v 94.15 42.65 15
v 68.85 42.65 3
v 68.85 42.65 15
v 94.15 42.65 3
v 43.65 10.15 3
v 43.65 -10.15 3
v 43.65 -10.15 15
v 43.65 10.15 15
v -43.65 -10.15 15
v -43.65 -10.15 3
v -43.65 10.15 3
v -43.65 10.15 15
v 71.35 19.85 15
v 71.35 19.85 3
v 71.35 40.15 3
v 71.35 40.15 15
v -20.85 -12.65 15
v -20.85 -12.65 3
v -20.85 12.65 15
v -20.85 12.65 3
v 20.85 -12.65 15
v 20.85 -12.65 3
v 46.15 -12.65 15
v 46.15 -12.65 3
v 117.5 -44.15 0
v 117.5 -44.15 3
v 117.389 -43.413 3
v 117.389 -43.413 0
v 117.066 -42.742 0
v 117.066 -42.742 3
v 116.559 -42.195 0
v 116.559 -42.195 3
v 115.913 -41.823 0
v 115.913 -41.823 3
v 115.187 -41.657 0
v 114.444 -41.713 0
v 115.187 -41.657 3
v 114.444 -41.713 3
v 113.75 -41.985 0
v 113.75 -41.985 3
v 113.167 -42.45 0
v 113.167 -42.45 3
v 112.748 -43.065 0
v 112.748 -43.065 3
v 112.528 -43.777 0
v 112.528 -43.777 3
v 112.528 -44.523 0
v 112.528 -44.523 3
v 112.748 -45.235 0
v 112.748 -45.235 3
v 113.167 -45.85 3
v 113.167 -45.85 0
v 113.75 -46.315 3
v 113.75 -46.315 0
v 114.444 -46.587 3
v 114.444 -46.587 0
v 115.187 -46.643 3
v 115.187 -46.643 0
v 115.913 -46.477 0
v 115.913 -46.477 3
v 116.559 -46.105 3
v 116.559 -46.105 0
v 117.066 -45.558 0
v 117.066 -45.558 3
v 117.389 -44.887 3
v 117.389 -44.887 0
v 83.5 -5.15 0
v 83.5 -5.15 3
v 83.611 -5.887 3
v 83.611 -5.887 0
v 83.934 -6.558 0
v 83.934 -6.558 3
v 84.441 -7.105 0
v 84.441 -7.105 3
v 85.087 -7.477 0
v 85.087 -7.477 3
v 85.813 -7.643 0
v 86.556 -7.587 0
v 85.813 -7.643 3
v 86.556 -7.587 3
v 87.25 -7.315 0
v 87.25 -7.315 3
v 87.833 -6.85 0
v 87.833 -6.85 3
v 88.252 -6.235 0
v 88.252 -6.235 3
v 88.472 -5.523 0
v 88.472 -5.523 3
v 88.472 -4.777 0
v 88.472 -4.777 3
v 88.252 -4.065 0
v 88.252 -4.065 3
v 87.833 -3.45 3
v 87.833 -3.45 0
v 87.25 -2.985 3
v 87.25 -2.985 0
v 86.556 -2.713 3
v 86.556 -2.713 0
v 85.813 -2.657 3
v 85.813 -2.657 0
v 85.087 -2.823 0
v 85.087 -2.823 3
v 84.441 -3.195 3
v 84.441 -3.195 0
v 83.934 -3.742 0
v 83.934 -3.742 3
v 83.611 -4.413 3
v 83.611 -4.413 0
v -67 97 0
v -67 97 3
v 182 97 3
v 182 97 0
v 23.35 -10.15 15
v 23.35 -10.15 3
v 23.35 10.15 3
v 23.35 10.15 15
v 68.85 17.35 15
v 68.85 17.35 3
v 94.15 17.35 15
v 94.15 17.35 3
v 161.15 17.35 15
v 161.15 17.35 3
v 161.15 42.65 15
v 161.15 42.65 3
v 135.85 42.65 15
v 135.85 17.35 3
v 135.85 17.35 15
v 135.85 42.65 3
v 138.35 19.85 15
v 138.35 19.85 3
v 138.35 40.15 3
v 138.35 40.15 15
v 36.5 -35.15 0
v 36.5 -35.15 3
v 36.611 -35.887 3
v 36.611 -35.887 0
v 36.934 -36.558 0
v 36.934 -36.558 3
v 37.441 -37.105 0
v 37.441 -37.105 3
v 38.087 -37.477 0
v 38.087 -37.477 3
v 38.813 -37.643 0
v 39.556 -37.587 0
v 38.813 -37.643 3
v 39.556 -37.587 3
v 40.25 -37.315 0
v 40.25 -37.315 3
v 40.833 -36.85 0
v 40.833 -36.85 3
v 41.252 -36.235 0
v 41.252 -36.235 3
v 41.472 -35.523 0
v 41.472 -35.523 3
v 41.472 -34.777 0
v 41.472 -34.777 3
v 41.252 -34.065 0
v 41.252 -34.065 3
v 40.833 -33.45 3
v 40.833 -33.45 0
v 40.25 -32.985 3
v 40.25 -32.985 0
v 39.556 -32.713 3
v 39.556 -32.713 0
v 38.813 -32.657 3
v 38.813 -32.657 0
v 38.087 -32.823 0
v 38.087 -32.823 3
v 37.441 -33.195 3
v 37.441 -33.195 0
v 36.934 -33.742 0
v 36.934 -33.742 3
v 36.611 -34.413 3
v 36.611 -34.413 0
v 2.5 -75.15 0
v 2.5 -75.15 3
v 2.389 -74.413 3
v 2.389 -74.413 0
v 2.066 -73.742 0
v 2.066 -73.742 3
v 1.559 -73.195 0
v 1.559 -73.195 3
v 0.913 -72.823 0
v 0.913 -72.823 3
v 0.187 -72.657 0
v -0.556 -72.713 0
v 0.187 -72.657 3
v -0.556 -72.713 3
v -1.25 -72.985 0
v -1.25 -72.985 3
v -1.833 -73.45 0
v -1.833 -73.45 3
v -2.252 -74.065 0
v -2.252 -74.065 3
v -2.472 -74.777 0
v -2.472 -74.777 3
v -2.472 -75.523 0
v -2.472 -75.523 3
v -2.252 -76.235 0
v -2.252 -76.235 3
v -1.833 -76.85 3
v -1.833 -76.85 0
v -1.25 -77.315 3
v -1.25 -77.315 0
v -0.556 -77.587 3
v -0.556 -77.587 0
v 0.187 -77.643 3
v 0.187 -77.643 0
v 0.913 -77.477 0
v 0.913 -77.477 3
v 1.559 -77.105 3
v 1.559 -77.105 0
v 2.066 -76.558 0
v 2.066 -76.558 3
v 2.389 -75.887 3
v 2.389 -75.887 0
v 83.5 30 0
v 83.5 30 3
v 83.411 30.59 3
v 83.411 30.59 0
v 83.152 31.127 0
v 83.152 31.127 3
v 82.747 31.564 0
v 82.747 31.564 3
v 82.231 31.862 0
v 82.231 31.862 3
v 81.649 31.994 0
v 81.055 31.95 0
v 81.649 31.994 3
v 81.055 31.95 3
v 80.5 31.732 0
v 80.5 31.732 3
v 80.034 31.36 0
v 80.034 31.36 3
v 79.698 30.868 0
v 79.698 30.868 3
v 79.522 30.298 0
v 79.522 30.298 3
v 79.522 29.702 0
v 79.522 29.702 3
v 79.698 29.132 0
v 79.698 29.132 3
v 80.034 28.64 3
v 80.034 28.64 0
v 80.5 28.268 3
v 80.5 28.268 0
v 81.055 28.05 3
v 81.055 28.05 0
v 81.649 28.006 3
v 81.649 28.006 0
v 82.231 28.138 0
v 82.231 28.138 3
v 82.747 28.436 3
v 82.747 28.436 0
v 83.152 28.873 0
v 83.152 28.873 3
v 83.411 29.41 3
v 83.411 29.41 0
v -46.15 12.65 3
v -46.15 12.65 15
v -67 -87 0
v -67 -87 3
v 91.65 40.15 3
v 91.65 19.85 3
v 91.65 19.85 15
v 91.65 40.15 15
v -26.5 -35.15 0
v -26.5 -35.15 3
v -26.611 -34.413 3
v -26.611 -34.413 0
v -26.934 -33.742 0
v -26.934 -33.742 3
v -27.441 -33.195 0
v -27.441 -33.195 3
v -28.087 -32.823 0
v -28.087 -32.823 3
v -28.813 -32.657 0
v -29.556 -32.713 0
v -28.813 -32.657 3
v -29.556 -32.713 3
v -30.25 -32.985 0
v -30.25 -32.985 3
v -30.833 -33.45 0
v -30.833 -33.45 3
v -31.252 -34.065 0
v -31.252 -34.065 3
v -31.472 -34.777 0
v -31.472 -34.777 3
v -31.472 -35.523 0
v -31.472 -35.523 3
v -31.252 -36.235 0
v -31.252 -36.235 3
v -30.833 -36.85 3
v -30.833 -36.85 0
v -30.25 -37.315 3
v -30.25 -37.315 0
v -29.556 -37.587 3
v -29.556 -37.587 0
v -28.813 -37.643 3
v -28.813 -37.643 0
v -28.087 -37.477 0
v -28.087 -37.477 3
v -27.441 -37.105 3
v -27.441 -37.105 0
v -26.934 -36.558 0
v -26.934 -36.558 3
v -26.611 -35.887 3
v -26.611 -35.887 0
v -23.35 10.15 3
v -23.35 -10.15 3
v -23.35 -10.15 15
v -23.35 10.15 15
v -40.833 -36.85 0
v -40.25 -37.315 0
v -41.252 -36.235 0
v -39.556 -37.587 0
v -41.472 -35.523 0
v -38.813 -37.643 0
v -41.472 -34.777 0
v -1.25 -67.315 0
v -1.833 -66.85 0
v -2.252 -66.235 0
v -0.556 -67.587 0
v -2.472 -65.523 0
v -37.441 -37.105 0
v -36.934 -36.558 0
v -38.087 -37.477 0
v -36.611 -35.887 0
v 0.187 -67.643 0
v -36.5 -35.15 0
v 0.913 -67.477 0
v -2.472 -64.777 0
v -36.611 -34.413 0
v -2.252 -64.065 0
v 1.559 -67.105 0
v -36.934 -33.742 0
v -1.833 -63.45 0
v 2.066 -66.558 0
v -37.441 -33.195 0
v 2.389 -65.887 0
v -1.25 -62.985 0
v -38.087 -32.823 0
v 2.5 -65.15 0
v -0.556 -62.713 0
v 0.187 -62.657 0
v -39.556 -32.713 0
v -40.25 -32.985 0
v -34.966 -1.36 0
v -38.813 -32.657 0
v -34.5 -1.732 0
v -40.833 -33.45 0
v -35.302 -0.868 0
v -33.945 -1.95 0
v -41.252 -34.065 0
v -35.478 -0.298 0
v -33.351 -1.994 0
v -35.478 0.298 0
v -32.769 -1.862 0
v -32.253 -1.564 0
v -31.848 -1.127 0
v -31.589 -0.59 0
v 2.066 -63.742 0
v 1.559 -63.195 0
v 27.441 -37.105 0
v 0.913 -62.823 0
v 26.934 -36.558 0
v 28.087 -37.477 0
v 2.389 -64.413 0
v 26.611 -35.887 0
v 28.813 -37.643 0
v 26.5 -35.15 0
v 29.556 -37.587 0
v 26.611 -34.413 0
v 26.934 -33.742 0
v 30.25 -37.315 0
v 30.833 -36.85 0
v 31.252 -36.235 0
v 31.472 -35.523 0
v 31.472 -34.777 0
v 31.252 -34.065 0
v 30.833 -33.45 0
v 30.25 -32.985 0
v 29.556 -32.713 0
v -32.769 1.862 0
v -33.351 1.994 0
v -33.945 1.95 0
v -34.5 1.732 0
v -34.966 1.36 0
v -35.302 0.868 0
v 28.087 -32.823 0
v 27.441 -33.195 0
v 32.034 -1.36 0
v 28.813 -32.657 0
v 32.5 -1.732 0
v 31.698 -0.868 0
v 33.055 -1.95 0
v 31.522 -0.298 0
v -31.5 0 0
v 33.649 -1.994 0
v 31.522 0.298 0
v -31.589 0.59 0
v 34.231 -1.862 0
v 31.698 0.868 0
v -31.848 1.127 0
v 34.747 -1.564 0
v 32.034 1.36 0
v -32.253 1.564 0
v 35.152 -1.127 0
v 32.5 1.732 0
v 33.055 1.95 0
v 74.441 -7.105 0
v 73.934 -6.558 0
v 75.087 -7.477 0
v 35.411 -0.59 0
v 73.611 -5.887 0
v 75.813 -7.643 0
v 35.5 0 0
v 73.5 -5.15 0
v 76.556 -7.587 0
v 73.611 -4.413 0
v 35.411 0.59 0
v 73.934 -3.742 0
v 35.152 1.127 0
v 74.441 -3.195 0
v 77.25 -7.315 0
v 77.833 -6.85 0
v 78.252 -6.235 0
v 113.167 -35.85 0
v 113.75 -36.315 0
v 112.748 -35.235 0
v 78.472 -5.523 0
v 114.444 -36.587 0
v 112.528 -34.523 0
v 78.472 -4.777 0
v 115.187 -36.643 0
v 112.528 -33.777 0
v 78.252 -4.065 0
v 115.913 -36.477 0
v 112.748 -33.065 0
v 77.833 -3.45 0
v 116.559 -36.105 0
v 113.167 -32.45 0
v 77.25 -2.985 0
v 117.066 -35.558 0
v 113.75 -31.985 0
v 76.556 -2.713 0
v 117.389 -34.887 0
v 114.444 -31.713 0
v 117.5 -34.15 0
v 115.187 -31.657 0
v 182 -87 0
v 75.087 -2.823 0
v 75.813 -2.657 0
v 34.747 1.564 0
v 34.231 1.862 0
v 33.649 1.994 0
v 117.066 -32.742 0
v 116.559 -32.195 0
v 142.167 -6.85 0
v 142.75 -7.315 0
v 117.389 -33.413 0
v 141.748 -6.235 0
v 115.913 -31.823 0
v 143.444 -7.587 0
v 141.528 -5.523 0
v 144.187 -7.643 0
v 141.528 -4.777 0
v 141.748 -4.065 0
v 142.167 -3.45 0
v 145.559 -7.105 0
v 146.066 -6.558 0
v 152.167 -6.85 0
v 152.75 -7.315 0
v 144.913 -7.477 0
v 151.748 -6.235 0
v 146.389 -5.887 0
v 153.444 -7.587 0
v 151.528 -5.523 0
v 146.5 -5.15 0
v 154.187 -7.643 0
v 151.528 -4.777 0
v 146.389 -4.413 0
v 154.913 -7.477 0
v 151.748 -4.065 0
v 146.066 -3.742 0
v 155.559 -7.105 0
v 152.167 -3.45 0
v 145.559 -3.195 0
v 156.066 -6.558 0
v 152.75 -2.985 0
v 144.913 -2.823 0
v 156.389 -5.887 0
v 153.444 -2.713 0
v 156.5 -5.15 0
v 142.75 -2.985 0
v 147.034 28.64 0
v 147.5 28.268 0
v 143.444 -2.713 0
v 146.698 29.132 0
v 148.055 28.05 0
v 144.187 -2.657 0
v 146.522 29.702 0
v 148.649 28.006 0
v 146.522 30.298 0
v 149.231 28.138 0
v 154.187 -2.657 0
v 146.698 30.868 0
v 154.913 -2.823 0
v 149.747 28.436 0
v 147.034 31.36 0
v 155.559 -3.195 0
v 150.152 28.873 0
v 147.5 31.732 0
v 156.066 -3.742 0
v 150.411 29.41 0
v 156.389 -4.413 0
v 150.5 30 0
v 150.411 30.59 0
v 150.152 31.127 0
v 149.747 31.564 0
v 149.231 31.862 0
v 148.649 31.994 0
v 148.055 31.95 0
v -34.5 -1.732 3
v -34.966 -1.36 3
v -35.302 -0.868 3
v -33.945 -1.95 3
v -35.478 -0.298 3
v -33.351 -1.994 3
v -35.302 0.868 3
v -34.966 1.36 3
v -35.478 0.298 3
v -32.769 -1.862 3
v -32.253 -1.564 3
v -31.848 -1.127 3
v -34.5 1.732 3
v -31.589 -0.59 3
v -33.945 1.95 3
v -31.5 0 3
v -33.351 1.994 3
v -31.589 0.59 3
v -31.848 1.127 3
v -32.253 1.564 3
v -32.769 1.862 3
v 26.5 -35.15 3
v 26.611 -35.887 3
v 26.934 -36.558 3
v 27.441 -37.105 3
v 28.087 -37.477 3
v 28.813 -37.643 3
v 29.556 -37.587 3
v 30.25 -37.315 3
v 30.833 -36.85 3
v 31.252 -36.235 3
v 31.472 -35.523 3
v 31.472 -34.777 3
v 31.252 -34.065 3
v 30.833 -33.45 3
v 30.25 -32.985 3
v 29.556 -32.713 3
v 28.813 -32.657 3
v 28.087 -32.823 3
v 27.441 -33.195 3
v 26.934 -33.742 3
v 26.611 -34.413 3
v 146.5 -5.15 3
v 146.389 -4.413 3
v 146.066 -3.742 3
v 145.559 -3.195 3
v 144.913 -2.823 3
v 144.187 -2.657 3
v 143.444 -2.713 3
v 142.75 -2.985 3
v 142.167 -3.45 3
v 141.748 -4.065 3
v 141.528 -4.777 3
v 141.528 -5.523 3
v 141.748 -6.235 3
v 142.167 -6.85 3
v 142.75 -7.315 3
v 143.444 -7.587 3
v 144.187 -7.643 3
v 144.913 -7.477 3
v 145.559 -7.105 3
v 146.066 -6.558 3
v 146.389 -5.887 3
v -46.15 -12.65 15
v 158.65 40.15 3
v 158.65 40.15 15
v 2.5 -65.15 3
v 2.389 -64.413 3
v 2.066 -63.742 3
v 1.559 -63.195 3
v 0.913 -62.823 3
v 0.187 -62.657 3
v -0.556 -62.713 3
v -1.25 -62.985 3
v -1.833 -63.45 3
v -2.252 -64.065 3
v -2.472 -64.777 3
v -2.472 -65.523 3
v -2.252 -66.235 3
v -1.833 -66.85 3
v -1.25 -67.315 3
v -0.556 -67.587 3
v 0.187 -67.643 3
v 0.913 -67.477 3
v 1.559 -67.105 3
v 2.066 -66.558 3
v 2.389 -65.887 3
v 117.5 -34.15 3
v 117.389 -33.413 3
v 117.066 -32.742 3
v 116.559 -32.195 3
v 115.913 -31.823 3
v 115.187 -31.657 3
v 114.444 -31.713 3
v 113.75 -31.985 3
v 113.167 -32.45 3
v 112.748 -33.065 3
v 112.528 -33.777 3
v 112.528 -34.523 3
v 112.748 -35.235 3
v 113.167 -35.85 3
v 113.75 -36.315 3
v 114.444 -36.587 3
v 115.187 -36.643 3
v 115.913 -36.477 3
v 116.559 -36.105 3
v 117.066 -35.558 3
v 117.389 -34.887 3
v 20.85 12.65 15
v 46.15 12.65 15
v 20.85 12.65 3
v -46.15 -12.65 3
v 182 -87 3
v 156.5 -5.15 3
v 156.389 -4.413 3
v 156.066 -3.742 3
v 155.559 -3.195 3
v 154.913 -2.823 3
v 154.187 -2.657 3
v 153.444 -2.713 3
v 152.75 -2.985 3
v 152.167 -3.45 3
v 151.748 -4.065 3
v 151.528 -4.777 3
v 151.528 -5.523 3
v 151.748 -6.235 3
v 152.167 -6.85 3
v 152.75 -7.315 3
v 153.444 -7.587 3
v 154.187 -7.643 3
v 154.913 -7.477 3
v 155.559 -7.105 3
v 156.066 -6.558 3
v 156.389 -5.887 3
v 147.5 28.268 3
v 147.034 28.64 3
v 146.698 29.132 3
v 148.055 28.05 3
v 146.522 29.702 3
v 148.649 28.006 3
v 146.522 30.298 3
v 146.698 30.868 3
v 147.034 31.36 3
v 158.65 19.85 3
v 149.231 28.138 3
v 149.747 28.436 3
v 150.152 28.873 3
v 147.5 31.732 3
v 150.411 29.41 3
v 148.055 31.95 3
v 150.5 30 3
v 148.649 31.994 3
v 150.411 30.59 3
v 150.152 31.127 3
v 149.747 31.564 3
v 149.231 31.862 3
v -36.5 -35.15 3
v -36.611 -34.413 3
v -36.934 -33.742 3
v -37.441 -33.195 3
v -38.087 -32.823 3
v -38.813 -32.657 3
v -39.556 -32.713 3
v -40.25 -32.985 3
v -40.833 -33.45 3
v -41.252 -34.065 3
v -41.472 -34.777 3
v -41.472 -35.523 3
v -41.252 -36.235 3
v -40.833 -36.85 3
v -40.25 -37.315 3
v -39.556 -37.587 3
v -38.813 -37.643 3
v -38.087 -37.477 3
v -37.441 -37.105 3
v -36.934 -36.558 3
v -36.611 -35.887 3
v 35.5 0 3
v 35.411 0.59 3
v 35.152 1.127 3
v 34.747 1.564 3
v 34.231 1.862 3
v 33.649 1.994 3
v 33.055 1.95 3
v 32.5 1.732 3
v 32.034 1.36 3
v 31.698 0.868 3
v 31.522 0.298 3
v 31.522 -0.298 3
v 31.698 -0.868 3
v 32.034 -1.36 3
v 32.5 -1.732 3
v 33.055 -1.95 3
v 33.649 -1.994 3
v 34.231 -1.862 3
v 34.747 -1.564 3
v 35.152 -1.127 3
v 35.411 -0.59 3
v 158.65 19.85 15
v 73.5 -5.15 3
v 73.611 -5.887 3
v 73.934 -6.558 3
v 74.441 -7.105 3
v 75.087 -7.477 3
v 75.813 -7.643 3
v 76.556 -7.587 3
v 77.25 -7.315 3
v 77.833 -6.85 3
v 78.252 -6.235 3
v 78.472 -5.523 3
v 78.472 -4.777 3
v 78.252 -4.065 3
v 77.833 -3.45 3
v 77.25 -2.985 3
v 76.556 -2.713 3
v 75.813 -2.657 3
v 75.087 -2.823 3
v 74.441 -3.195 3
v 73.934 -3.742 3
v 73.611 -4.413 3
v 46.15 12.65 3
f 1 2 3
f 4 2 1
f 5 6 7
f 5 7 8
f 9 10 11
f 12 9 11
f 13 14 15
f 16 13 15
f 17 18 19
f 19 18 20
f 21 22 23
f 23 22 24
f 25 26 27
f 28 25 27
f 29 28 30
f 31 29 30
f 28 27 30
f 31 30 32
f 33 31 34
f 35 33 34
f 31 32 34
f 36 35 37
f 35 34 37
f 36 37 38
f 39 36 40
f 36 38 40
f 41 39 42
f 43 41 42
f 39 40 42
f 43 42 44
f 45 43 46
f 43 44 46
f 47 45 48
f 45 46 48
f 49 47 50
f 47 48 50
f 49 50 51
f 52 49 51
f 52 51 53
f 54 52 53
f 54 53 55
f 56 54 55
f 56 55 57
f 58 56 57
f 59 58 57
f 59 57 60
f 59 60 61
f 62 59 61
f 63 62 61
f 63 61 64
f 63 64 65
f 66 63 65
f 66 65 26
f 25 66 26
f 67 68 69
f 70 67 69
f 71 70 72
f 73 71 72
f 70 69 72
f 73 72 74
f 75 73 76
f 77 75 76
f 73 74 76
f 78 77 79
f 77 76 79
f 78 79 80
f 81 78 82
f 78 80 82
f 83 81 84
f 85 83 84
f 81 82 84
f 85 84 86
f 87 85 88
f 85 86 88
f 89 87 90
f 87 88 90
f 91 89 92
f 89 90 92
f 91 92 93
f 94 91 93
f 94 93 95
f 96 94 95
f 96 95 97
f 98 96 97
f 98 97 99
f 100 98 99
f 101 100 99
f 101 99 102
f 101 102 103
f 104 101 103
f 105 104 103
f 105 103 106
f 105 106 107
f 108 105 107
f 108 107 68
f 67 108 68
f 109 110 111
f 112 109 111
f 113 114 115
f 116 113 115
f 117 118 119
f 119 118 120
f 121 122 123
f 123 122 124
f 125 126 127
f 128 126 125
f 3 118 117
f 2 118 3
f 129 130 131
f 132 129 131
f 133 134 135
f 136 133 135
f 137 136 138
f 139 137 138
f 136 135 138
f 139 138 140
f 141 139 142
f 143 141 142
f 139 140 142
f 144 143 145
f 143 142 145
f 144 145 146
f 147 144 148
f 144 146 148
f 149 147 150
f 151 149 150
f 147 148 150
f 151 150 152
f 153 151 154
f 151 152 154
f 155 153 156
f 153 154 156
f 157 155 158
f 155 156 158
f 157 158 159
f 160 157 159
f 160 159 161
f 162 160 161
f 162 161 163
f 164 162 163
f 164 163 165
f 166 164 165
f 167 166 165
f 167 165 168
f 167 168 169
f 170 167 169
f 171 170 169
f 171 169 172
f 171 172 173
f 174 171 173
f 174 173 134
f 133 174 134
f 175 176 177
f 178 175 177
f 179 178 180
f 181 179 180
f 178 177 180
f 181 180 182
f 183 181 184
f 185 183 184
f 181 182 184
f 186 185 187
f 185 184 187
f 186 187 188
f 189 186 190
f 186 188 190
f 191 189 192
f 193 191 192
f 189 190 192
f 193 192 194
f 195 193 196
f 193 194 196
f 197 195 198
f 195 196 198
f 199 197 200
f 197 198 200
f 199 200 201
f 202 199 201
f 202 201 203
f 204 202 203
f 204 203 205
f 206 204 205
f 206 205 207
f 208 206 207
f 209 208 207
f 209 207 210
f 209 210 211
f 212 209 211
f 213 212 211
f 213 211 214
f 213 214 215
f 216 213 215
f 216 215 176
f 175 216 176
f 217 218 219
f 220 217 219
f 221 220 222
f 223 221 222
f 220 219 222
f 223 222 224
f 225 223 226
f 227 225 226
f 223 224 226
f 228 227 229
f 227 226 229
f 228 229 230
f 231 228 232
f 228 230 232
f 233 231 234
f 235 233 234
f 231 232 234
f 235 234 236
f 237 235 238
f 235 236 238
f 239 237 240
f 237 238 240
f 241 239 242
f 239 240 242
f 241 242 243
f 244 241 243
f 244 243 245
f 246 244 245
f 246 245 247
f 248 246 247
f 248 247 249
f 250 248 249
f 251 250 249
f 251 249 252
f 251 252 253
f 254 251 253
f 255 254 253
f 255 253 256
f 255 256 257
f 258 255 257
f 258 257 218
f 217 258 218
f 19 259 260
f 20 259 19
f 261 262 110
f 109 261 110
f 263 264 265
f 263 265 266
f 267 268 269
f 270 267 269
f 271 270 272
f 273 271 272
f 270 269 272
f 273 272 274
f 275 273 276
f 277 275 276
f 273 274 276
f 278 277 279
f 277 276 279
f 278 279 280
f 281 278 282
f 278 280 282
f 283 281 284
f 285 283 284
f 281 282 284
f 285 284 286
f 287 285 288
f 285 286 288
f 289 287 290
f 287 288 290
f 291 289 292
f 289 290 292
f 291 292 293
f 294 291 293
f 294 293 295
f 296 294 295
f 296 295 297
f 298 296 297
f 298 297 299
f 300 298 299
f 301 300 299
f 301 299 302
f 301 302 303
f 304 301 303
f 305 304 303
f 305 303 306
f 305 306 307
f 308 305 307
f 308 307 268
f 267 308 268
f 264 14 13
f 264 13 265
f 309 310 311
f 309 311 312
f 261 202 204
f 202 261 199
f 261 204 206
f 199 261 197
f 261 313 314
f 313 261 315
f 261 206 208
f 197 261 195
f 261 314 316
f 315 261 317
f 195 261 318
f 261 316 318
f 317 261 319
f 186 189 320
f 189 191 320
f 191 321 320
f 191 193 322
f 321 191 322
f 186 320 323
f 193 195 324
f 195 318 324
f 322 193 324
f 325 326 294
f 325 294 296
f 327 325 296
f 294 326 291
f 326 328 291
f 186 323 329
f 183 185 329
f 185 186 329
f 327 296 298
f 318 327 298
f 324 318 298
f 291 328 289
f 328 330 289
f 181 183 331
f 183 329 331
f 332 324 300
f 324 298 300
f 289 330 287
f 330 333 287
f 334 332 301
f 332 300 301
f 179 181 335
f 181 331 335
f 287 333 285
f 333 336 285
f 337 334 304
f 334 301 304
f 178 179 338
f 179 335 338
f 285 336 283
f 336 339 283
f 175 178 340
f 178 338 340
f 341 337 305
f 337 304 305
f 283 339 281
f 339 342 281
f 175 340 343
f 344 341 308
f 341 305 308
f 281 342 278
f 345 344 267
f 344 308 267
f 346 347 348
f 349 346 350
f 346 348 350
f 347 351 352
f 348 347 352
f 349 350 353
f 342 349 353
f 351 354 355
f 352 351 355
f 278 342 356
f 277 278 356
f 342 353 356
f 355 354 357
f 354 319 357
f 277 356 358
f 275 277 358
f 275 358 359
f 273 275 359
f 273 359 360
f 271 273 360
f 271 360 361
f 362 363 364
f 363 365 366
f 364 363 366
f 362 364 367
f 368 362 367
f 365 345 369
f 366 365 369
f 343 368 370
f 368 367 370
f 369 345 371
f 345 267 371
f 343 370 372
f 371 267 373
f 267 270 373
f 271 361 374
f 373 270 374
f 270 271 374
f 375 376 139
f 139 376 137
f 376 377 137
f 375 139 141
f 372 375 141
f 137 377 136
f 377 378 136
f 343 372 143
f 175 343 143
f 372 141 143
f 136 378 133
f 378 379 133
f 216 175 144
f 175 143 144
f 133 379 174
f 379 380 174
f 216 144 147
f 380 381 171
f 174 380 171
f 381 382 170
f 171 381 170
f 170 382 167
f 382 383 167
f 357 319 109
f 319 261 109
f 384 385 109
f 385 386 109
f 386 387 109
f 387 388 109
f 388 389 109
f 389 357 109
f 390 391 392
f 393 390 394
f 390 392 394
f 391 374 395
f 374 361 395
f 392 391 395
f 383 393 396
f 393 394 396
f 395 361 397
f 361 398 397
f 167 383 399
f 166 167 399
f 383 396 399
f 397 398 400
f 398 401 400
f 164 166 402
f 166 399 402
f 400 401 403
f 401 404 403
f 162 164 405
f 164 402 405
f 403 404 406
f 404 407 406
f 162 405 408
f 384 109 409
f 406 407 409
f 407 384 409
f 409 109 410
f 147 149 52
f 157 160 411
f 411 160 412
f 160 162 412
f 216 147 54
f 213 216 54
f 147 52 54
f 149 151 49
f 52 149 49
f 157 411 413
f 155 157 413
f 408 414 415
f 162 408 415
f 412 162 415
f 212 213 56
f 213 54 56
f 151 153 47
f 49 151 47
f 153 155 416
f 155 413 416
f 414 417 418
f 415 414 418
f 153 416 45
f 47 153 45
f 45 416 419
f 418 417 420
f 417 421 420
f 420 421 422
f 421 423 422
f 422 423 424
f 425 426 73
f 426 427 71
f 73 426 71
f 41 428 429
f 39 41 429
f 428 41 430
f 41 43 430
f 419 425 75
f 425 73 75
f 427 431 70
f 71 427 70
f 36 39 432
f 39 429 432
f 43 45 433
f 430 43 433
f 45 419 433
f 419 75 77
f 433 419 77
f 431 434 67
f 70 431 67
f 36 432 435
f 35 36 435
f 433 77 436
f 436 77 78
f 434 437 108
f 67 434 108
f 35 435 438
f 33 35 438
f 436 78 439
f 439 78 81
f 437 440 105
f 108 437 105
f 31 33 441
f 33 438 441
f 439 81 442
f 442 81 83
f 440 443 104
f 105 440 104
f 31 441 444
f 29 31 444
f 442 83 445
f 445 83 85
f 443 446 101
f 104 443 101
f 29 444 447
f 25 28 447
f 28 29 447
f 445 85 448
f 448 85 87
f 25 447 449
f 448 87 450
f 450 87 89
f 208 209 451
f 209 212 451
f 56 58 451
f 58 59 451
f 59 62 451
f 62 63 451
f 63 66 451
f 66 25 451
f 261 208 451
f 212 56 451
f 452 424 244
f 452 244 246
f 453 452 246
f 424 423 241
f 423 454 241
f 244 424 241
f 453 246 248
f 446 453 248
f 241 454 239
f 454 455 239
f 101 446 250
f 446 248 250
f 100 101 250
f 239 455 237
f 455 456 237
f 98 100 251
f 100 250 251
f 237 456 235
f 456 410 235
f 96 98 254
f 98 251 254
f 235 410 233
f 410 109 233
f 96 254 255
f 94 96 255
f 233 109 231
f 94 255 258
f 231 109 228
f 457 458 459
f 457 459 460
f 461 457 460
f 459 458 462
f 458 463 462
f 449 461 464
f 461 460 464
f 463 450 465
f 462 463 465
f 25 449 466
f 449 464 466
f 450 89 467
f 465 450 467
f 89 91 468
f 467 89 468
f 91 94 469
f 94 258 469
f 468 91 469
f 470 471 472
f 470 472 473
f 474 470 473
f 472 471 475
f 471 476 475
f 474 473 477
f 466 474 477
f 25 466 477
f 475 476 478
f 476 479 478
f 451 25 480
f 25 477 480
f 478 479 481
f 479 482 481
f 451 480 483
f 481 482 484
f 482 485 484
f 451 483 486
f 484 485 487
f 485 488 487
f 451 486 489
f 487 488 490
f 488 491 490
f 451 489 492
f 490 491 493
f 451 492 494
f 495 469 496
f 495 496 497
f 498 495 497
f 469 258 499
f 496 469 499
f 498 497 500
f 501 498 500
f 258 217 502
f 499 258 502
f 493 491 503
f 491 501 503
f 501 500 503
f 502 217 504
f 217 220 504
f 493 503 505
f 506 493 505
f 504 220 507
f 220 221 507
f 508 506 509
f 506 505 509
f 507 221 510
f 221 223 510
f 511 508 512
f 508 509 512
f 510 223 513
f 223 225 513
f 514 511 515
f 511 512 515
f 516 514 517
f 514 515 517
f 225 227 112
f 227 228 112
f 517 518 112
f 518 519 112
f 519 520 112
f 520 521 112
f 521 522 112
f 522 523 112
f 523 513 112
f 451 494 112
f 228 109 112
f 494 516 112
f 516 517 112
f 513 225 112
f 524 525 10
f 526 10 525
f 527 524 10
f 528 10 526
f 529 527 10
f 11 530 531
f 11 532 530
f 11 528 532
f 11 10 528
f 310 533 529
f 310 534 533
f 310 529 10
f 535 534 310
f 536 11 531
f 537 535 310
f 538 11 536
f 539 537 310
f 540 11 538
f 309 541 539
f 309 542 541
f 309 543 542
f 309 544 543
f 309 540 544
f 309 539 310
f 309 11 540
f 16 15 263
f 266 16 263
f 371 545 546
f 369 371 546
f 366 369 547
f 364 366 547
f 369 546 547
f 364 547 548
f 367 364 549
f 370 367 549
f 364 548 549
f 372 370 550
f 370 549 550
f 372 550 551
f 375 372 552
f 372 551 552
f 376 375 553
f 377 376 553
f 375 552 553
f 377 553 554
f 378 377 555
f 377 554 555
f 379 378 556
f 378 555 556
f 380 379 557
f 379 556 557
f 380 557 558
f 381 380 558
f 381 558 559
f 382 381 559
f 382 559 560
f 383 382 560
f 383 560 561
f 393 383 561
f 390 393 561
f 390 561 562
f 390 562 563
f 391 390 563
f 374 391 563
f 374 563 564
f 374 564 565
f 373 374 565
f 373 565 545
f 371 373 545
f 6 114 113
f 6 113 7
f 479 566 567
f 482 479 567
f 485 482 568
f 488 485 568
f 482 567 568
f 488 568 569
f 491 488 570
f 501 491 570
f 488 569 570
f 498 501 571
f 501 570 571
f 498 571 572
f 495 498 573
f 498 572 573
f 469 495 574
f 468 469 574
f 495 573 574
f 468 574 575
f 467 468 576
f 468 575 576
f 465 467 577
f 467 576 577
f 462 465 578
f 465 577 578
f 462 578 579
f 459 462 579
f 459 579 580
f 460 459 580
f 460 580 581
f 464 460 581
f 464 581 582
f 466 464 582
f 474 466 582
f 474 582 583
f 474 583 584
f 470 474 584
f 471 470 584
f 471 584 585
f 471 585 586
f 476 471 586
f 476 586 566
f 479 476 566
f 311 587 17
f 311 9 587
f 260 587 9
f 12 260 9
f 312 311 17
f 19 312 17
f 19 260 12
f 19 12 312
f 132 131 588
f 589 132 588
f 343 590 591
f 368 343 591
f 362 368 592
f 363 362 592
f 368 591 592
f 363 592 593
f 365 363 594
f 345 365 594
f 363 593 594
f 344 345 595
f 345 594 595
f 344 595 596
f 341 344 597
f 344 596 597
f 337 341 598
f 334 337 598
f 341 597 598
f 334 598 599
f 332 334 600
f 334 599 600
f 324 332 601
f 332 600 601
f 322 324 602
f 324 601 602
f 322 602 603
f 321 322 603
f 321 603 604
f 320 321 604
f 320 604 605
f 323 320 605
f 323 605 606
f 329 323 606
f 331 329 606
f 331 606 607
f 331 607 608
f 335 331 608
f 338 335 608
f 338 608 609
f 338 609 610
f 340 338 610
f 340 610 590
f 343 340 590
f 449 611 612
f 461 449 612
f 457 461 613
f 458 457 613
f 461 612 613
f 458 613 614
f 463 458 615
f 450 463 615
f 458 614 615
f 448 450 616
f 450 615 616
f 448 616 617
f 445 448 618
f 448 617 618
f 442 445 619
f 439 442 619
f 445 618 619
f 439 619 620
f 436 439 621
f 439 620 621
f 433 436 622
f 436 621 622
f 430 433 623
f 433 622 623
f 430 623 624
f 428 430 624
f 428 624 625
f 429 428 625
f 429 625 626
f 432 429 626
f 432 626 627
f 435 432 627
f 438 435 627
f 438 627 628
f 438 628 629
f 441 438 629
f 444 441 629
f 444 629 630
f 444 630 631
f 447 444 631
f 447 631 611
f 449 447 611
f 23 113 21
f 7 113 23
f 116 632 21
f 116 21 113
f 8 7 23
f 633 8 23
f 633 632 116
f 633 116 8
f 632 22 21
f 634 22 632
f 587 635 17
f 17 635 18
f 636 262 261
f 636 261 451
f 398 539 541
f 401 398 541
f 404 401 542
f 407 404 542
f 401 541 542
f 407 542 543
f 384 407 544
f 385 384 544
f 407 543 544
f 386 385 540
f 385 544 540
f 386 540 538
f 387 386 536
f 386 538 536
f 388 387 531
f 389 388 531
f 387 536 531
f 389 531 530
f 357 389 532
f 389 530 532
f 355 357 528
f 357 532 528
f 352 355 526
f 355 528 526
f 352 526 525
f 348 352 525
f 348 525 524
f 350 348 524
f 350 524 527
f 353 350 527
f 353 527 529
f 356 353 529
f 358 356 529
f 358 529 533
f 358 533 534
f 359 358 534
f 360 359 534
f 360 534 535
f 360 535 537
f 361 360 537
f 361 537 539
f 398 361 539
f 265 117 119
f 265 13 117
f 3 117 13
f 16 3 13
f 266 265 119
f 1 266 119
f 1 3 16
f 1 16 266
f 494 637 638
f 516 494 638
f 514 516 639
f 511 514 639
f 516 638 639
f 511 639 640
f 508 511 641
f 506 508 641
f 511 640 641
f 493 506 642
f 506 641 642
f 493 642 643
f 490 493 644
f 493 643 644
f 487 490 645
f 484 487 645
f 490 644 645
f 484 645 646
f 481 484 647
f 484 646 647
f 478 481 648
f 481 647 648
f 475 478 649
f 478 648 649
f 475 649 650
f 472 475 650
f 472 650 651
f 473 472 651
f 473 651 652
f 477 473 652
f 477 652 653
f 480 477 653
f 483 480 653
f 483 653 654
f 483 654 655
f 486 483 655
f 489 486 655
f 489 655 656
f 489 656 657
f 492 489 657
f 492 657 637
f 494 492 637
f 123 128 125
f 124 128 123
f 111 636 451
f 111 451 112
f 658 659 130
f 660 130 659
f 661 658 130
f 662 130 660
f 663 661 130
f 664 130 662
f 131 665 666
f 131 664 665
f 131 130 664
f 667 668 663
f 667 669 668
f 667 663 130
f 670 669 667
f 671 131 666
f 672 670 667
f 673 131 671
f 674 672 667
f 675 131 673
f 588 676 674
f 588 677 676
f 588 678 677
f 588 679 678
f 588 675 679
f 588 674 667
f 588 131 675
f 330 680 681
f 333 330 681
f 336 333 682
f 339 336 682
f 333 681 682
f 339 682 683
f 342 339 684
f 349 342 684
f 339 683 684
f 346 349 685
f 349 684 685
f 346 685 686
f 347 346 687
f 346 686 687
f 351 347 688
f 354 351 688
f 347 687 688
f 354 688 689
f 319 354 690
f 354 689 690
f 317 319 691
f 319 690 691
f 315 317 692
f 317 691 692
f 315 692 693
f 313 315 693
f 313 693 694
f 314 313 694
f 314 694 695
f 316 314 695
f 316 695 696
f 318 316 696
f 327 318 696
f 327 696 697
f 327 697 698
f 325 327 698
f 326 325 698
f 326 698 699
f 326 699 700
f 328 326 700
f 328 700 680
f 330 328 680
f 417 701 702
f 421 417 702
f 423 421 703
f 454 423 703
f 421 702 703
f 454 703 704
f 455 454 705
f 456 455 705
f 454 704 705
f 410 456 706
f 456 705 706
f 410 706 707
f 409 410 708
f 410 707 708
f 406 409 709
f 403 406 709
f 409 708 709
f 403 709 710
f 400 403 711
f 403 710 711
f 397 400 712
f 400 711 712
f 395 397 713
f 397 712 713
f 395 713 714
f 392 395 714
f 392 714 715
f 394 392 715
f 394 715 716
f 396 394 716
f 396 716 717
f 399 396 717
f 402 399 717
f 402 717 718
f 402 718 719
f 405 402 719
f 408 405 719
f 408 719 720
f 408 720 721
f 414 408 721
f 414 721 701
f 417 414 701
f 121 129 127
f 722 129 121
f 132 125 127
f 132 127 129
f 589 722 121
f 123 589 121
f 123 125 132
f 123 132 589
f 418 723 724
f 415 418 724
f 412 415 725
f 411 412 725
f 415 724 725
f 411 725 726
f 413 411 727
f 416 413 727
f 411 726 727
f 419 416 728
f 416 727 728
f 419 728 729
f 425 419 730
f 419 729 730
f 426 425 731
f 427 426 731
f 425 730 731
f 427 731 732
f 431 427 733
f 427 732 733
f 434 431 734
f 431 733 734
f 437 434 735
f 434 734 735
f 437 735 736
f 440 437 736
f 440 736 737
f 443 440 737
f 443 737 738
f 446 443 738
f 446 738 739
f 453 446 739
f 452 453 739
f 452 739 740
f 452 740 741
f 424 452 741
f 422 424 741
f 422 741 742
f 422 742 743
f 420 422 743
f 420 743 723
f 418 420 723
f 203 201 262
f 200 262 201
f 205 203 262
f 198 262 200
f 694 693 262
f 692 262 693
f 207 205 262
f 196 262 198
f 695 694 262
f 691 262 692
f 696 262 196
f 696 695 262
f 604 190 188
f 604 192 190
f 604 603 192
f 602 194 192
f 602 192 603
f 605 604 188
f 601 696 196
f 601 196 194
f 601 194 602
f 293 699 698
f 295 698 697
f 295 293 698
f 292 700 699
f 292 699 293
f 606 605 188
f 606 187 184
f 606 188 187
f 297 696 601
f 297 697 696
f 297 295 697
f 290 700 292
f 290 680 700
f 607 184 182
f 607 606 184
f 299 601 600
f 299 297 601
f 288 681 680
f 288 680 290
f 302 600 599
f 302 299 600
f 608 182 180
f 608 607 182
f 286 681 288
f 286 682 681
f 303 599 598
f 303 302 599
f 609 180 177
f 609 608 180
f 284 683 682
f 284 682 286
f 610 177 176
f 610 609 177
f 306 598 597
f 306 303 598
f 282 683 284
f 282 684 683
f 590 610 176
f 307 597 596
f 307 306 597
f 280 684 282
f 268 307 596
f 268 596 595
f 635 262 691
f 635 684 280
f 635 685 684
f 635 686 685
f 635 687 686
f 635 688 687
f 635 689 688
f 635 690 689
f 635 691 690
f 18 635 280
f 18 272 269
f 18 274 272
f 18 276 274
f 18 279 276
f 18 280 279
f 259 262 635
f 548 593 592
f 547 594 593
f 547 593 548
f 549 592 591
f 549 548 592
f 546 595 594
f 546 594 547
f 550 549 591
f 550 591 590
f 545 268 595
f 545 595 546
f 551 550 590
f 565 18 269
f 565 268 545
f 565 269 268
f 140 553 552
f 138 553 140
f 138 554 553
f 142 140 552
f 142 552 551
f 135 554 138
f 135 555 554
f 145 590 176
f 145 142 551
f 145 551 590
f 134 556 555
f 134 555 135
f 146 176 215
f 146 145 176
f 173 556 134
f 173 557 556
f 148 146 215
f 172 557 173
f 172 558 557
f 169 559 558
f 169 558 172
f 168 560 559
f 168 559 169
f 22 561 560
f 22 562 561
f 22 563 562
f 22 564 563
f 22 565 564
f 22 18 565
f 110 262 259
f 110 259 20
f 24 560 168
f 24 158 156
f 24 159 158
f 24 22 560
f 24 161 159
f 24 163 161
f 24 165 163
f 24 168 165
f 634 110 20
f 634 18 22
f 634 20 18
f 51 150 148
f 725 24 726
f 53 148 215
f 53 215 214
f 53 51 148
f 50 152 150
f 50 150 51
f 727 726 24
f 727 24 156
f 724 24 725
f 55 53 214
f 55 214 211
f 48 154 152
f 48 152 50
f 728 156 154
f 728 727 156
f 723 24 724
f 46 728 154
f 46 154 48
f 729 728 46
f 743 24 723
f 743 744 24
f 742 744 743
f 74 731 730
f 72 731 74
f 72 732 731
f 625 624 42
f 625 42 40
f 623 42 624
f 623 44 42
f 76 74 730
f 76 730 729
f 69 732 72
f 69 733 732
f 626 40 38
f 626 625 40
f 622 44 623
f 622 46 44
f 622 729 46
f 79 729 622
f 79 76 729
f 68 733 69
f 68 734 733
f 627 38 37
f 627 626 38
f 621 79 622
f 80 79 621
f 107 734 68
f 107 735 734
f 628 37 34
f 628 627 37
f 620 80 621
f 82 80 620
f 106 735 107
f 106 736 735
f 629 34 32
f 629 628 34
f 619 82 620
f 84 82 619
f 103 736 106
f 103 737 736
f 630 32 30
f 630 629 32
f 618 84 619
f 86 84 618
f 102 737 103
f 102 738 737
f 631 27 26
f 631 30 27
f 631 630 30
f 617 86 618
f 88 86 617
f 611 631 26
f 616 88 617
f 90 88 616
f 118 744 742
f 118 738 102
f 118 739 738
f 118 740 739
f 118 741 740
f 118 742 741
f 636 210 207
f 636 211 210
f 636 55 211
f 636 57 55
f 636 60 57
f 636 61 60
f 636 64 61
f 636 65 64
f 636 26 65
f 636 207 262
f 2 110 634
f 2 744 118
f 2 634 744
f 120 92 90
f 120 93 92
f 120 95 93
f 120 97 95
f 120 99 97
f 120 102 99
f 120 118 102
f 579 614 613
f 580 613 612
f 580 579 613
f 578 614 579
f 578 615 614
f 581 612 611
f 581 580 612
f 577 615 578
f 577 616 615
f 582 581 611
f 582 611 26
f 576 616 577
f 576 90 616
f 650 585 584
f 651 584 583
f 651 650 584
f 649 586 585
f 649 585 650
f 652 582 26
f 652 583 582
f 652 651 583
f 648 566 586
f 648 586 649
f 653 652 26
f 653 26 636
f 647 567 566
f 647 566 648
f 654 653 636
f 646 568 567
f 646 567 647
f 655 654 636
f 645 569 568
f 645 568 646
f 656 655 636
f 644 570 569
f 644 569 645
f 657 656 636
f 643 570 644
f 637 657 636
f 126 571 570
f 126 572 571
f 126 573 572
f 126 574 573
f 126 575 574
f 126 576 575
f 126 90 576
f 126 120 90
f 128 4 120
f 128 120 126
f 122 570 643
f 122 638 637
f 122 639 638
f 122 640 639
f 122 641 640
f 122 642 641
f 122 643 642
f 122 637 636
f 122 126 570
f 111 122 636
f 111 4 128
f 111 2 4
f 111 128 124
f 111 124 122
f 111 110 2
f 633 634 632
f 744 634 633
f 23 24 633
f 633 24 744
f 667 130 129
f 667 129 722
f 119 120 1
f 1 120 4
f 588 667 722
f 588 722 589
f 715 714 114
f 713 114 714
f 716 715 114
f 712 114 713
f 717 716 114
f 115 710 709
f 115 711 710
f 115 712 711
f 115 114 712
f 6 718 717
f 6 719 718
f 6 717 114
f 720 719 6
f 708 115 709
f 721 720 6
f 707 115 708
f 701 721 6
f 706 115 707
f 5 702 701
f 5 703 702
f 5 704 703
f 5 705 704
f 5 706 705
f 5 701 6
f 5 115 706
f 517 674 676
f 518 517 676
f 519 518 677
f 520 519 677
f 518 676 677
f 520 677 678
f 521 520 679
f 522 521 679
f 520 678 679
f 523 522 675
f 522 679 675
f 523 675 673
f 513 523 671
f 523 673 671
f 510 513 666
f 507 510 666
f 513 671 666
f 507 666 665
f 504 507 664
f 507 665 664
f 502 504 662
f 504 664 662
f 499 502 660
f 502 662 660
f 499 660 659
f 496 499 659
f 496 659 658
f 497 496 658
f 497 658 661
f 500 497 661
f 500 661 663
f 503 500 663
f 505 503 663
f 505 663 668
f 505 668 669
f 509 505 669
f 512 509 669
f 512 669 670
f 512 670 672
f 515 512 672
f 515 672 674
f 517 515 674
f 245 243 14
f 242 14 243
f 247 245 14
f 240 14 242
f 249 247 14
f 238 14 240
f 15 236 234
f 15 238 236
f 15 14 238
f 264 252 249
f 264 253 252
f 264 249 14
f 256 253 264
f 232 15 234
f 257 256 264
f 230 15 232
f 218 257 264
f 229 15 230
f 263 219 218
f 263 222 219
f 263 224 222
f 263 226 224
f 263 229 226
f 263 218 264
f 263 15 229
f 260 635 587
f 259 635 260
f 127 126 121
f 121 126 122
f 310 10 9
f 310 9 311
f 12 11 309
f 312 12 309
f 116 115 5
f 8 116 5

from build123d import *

# Parameters (mm, degrees)
CROQUIS1_W              = 134
CROQUIS1_H              = 54
SALIENTE_EXTRUIR1_DEPTH = 3
CROQUIS2_W              = 25.3
CROQUIS2_H              = 25.3
CROQUIS2_W_2            = 20.3
CROQUIS2_H_2            = 20.3
SALIENTE_EXTRUIR2_DEPTH = 12
CROQUIS4_R              = 2
CORTAR_EXTRUIR1_DEPTH   = 12
CROQUIS5_W              = 115
CROQUIS5_H              = 30
SALIENTE_EXTRUIR3_DEPTH = 3
CROQUIS6_W              = 249
CROQUIS6_H              = 40
CROQUIS6_H_2            = 60
SALIENTE_EXTRUIR4_DEPTH = 3
CROQUIS8_R              = 2.5
CORTAR_EXTRUIR3_DEPTH   = 10


with BuildPart() as part:
    # Croquis1 → Saliente-Extruir1 (new body)
    with BuildSketch(Plane.XY):
        Rectangle(CROQUIS1_W, CROQUIS1_H)
    extrude(amount=SALIENTE_EXTRUIR1_DEPTH)

    # Croquis2 → Saliente-Extruir2 (add)
    # profile 1 of 2: a face of its own
    with BuildSketch(Plane.XY.offset(3)):
        with Locations((-33.5, 0)):
            Rectangle(CROQUIS2_W, CROQUIS2_H)
        with Locations((-33.5, 0)):
            Rectangle(CROQUIS2_W_2, CROQUIS2_H_2, mode=Mode.SUBTRACT)
    # profile 2 of 2: a face of its own
    with BuildSketch(Plane.XY.offset(3)):
        with Locations((33.5, 0)):
            Rectangle(CROQUIS2_W, CROQUIS2_H)
        with Locations((33.5, 0)):
            Rectangle(CROQUIS2_W_2, CROQUIS2_H_2, mode=Mode.SUBTRACT)
    extrude(amount=SALIENTE_EXTRUIR2_DEPTH)


with BuildPart() as body_2:
    # Sólido-Mover/Copiar1: copy of part
    add(part.part.moved(Location((115, 30, 0))))

    # Combinar1: union part
    add(part.part)

    # Croquis4 → Cortar-Extruir1 (cut)
    with BuildSketch(Plane.XY.offset(3)):
        with Locations((-33.5, 0)):
            Circle(CROQUIS4_R)
        with Locations((33.5, 0)):
            Circle(CROQUIS4_R)
        with Locations((81.5, 30)):
            Circle(CROQUIS4_R)
        with Locations((148.5, 30)):
            Circle(CROQUIS4_R)
    extrude(amount=-CORTAR_EXTRUIR1_DEPTH, mode=Mode.SUBTRACT)

    # Croquis5 → Saliente-Extruir3 (add)
    with BuildSketch(Plane.XY.offset(3)):
        with Locations((-9.5, 42)):
            Rectangle(CROQUIS5_W, CROQUIS5_H)
        with Locations((124.5, -12)):
            Rectangle(CROQUIS5_W, CROQUIS5_H)
    extrude(amount=-SALIENTE_EXTRUIR3_DEPTH)

    # Croquis6 → Saliente-Extruir4 (add)
    with BuildSketch(Plane.XY.offset(3)):
        with Locations((57.5, 77)):
            Rectangle(CROQUIS6_W, CROQUIS6_H)
        with Locations((57.5, -57)):
            Rectangle(CROQUIS6_W, CROQUIS6_H_2)
    extrude(amount=-SALIENTE_EXTRUIR4_DEPTH)

    # Croquis8 → Cortar-Extruir3 (cut)
    with BuildSketch(Plane.XY.offset(3)):
        with Locations((144, -5.15)):
            Circle(CROQUIS8_R)
        with Locations((154, -5.15)):
            Circle(CROQUIS8_R)
        with Locations((115, -34.15)):
            Circle(CROQUIS8_R)
        with Locations((115, -44.15)):
            Circle(CROQUIS8_R)
        with Locations(Location((76, -5.15, 0), (0, 0, 180))):
            Circle(CROQUIS8_R)
        with Locations(Location((86, -5.15, 0), (0, 0, 180))):
            Circle(CROQUIS8_R)
        with Locations((-29, -35.15)):
            Circle(CROQUIS8_R)
        with Locations((-39, -35.15)):
            Circle(CROQUIS8_R)
        with Locations((0, -65.15)):
            Circle(CROQUIS8_R)
        with Locations((0, -75.15)):
            Circle(CROQUIS8_R)
        with Locations(Location((39, -35.15, 0), (0, 0, 180))):
            Circle(CROQUIS8_R)
        with Locations(Location((29, -35.15, 0), (0, 0, 180))):
            Circle(CROQUIS8_R)
    extrude(amount=-CORTAR_EXTRUIR3_DEPTH, mode=Mode.SUBTRACT)


solid = body_2.part
